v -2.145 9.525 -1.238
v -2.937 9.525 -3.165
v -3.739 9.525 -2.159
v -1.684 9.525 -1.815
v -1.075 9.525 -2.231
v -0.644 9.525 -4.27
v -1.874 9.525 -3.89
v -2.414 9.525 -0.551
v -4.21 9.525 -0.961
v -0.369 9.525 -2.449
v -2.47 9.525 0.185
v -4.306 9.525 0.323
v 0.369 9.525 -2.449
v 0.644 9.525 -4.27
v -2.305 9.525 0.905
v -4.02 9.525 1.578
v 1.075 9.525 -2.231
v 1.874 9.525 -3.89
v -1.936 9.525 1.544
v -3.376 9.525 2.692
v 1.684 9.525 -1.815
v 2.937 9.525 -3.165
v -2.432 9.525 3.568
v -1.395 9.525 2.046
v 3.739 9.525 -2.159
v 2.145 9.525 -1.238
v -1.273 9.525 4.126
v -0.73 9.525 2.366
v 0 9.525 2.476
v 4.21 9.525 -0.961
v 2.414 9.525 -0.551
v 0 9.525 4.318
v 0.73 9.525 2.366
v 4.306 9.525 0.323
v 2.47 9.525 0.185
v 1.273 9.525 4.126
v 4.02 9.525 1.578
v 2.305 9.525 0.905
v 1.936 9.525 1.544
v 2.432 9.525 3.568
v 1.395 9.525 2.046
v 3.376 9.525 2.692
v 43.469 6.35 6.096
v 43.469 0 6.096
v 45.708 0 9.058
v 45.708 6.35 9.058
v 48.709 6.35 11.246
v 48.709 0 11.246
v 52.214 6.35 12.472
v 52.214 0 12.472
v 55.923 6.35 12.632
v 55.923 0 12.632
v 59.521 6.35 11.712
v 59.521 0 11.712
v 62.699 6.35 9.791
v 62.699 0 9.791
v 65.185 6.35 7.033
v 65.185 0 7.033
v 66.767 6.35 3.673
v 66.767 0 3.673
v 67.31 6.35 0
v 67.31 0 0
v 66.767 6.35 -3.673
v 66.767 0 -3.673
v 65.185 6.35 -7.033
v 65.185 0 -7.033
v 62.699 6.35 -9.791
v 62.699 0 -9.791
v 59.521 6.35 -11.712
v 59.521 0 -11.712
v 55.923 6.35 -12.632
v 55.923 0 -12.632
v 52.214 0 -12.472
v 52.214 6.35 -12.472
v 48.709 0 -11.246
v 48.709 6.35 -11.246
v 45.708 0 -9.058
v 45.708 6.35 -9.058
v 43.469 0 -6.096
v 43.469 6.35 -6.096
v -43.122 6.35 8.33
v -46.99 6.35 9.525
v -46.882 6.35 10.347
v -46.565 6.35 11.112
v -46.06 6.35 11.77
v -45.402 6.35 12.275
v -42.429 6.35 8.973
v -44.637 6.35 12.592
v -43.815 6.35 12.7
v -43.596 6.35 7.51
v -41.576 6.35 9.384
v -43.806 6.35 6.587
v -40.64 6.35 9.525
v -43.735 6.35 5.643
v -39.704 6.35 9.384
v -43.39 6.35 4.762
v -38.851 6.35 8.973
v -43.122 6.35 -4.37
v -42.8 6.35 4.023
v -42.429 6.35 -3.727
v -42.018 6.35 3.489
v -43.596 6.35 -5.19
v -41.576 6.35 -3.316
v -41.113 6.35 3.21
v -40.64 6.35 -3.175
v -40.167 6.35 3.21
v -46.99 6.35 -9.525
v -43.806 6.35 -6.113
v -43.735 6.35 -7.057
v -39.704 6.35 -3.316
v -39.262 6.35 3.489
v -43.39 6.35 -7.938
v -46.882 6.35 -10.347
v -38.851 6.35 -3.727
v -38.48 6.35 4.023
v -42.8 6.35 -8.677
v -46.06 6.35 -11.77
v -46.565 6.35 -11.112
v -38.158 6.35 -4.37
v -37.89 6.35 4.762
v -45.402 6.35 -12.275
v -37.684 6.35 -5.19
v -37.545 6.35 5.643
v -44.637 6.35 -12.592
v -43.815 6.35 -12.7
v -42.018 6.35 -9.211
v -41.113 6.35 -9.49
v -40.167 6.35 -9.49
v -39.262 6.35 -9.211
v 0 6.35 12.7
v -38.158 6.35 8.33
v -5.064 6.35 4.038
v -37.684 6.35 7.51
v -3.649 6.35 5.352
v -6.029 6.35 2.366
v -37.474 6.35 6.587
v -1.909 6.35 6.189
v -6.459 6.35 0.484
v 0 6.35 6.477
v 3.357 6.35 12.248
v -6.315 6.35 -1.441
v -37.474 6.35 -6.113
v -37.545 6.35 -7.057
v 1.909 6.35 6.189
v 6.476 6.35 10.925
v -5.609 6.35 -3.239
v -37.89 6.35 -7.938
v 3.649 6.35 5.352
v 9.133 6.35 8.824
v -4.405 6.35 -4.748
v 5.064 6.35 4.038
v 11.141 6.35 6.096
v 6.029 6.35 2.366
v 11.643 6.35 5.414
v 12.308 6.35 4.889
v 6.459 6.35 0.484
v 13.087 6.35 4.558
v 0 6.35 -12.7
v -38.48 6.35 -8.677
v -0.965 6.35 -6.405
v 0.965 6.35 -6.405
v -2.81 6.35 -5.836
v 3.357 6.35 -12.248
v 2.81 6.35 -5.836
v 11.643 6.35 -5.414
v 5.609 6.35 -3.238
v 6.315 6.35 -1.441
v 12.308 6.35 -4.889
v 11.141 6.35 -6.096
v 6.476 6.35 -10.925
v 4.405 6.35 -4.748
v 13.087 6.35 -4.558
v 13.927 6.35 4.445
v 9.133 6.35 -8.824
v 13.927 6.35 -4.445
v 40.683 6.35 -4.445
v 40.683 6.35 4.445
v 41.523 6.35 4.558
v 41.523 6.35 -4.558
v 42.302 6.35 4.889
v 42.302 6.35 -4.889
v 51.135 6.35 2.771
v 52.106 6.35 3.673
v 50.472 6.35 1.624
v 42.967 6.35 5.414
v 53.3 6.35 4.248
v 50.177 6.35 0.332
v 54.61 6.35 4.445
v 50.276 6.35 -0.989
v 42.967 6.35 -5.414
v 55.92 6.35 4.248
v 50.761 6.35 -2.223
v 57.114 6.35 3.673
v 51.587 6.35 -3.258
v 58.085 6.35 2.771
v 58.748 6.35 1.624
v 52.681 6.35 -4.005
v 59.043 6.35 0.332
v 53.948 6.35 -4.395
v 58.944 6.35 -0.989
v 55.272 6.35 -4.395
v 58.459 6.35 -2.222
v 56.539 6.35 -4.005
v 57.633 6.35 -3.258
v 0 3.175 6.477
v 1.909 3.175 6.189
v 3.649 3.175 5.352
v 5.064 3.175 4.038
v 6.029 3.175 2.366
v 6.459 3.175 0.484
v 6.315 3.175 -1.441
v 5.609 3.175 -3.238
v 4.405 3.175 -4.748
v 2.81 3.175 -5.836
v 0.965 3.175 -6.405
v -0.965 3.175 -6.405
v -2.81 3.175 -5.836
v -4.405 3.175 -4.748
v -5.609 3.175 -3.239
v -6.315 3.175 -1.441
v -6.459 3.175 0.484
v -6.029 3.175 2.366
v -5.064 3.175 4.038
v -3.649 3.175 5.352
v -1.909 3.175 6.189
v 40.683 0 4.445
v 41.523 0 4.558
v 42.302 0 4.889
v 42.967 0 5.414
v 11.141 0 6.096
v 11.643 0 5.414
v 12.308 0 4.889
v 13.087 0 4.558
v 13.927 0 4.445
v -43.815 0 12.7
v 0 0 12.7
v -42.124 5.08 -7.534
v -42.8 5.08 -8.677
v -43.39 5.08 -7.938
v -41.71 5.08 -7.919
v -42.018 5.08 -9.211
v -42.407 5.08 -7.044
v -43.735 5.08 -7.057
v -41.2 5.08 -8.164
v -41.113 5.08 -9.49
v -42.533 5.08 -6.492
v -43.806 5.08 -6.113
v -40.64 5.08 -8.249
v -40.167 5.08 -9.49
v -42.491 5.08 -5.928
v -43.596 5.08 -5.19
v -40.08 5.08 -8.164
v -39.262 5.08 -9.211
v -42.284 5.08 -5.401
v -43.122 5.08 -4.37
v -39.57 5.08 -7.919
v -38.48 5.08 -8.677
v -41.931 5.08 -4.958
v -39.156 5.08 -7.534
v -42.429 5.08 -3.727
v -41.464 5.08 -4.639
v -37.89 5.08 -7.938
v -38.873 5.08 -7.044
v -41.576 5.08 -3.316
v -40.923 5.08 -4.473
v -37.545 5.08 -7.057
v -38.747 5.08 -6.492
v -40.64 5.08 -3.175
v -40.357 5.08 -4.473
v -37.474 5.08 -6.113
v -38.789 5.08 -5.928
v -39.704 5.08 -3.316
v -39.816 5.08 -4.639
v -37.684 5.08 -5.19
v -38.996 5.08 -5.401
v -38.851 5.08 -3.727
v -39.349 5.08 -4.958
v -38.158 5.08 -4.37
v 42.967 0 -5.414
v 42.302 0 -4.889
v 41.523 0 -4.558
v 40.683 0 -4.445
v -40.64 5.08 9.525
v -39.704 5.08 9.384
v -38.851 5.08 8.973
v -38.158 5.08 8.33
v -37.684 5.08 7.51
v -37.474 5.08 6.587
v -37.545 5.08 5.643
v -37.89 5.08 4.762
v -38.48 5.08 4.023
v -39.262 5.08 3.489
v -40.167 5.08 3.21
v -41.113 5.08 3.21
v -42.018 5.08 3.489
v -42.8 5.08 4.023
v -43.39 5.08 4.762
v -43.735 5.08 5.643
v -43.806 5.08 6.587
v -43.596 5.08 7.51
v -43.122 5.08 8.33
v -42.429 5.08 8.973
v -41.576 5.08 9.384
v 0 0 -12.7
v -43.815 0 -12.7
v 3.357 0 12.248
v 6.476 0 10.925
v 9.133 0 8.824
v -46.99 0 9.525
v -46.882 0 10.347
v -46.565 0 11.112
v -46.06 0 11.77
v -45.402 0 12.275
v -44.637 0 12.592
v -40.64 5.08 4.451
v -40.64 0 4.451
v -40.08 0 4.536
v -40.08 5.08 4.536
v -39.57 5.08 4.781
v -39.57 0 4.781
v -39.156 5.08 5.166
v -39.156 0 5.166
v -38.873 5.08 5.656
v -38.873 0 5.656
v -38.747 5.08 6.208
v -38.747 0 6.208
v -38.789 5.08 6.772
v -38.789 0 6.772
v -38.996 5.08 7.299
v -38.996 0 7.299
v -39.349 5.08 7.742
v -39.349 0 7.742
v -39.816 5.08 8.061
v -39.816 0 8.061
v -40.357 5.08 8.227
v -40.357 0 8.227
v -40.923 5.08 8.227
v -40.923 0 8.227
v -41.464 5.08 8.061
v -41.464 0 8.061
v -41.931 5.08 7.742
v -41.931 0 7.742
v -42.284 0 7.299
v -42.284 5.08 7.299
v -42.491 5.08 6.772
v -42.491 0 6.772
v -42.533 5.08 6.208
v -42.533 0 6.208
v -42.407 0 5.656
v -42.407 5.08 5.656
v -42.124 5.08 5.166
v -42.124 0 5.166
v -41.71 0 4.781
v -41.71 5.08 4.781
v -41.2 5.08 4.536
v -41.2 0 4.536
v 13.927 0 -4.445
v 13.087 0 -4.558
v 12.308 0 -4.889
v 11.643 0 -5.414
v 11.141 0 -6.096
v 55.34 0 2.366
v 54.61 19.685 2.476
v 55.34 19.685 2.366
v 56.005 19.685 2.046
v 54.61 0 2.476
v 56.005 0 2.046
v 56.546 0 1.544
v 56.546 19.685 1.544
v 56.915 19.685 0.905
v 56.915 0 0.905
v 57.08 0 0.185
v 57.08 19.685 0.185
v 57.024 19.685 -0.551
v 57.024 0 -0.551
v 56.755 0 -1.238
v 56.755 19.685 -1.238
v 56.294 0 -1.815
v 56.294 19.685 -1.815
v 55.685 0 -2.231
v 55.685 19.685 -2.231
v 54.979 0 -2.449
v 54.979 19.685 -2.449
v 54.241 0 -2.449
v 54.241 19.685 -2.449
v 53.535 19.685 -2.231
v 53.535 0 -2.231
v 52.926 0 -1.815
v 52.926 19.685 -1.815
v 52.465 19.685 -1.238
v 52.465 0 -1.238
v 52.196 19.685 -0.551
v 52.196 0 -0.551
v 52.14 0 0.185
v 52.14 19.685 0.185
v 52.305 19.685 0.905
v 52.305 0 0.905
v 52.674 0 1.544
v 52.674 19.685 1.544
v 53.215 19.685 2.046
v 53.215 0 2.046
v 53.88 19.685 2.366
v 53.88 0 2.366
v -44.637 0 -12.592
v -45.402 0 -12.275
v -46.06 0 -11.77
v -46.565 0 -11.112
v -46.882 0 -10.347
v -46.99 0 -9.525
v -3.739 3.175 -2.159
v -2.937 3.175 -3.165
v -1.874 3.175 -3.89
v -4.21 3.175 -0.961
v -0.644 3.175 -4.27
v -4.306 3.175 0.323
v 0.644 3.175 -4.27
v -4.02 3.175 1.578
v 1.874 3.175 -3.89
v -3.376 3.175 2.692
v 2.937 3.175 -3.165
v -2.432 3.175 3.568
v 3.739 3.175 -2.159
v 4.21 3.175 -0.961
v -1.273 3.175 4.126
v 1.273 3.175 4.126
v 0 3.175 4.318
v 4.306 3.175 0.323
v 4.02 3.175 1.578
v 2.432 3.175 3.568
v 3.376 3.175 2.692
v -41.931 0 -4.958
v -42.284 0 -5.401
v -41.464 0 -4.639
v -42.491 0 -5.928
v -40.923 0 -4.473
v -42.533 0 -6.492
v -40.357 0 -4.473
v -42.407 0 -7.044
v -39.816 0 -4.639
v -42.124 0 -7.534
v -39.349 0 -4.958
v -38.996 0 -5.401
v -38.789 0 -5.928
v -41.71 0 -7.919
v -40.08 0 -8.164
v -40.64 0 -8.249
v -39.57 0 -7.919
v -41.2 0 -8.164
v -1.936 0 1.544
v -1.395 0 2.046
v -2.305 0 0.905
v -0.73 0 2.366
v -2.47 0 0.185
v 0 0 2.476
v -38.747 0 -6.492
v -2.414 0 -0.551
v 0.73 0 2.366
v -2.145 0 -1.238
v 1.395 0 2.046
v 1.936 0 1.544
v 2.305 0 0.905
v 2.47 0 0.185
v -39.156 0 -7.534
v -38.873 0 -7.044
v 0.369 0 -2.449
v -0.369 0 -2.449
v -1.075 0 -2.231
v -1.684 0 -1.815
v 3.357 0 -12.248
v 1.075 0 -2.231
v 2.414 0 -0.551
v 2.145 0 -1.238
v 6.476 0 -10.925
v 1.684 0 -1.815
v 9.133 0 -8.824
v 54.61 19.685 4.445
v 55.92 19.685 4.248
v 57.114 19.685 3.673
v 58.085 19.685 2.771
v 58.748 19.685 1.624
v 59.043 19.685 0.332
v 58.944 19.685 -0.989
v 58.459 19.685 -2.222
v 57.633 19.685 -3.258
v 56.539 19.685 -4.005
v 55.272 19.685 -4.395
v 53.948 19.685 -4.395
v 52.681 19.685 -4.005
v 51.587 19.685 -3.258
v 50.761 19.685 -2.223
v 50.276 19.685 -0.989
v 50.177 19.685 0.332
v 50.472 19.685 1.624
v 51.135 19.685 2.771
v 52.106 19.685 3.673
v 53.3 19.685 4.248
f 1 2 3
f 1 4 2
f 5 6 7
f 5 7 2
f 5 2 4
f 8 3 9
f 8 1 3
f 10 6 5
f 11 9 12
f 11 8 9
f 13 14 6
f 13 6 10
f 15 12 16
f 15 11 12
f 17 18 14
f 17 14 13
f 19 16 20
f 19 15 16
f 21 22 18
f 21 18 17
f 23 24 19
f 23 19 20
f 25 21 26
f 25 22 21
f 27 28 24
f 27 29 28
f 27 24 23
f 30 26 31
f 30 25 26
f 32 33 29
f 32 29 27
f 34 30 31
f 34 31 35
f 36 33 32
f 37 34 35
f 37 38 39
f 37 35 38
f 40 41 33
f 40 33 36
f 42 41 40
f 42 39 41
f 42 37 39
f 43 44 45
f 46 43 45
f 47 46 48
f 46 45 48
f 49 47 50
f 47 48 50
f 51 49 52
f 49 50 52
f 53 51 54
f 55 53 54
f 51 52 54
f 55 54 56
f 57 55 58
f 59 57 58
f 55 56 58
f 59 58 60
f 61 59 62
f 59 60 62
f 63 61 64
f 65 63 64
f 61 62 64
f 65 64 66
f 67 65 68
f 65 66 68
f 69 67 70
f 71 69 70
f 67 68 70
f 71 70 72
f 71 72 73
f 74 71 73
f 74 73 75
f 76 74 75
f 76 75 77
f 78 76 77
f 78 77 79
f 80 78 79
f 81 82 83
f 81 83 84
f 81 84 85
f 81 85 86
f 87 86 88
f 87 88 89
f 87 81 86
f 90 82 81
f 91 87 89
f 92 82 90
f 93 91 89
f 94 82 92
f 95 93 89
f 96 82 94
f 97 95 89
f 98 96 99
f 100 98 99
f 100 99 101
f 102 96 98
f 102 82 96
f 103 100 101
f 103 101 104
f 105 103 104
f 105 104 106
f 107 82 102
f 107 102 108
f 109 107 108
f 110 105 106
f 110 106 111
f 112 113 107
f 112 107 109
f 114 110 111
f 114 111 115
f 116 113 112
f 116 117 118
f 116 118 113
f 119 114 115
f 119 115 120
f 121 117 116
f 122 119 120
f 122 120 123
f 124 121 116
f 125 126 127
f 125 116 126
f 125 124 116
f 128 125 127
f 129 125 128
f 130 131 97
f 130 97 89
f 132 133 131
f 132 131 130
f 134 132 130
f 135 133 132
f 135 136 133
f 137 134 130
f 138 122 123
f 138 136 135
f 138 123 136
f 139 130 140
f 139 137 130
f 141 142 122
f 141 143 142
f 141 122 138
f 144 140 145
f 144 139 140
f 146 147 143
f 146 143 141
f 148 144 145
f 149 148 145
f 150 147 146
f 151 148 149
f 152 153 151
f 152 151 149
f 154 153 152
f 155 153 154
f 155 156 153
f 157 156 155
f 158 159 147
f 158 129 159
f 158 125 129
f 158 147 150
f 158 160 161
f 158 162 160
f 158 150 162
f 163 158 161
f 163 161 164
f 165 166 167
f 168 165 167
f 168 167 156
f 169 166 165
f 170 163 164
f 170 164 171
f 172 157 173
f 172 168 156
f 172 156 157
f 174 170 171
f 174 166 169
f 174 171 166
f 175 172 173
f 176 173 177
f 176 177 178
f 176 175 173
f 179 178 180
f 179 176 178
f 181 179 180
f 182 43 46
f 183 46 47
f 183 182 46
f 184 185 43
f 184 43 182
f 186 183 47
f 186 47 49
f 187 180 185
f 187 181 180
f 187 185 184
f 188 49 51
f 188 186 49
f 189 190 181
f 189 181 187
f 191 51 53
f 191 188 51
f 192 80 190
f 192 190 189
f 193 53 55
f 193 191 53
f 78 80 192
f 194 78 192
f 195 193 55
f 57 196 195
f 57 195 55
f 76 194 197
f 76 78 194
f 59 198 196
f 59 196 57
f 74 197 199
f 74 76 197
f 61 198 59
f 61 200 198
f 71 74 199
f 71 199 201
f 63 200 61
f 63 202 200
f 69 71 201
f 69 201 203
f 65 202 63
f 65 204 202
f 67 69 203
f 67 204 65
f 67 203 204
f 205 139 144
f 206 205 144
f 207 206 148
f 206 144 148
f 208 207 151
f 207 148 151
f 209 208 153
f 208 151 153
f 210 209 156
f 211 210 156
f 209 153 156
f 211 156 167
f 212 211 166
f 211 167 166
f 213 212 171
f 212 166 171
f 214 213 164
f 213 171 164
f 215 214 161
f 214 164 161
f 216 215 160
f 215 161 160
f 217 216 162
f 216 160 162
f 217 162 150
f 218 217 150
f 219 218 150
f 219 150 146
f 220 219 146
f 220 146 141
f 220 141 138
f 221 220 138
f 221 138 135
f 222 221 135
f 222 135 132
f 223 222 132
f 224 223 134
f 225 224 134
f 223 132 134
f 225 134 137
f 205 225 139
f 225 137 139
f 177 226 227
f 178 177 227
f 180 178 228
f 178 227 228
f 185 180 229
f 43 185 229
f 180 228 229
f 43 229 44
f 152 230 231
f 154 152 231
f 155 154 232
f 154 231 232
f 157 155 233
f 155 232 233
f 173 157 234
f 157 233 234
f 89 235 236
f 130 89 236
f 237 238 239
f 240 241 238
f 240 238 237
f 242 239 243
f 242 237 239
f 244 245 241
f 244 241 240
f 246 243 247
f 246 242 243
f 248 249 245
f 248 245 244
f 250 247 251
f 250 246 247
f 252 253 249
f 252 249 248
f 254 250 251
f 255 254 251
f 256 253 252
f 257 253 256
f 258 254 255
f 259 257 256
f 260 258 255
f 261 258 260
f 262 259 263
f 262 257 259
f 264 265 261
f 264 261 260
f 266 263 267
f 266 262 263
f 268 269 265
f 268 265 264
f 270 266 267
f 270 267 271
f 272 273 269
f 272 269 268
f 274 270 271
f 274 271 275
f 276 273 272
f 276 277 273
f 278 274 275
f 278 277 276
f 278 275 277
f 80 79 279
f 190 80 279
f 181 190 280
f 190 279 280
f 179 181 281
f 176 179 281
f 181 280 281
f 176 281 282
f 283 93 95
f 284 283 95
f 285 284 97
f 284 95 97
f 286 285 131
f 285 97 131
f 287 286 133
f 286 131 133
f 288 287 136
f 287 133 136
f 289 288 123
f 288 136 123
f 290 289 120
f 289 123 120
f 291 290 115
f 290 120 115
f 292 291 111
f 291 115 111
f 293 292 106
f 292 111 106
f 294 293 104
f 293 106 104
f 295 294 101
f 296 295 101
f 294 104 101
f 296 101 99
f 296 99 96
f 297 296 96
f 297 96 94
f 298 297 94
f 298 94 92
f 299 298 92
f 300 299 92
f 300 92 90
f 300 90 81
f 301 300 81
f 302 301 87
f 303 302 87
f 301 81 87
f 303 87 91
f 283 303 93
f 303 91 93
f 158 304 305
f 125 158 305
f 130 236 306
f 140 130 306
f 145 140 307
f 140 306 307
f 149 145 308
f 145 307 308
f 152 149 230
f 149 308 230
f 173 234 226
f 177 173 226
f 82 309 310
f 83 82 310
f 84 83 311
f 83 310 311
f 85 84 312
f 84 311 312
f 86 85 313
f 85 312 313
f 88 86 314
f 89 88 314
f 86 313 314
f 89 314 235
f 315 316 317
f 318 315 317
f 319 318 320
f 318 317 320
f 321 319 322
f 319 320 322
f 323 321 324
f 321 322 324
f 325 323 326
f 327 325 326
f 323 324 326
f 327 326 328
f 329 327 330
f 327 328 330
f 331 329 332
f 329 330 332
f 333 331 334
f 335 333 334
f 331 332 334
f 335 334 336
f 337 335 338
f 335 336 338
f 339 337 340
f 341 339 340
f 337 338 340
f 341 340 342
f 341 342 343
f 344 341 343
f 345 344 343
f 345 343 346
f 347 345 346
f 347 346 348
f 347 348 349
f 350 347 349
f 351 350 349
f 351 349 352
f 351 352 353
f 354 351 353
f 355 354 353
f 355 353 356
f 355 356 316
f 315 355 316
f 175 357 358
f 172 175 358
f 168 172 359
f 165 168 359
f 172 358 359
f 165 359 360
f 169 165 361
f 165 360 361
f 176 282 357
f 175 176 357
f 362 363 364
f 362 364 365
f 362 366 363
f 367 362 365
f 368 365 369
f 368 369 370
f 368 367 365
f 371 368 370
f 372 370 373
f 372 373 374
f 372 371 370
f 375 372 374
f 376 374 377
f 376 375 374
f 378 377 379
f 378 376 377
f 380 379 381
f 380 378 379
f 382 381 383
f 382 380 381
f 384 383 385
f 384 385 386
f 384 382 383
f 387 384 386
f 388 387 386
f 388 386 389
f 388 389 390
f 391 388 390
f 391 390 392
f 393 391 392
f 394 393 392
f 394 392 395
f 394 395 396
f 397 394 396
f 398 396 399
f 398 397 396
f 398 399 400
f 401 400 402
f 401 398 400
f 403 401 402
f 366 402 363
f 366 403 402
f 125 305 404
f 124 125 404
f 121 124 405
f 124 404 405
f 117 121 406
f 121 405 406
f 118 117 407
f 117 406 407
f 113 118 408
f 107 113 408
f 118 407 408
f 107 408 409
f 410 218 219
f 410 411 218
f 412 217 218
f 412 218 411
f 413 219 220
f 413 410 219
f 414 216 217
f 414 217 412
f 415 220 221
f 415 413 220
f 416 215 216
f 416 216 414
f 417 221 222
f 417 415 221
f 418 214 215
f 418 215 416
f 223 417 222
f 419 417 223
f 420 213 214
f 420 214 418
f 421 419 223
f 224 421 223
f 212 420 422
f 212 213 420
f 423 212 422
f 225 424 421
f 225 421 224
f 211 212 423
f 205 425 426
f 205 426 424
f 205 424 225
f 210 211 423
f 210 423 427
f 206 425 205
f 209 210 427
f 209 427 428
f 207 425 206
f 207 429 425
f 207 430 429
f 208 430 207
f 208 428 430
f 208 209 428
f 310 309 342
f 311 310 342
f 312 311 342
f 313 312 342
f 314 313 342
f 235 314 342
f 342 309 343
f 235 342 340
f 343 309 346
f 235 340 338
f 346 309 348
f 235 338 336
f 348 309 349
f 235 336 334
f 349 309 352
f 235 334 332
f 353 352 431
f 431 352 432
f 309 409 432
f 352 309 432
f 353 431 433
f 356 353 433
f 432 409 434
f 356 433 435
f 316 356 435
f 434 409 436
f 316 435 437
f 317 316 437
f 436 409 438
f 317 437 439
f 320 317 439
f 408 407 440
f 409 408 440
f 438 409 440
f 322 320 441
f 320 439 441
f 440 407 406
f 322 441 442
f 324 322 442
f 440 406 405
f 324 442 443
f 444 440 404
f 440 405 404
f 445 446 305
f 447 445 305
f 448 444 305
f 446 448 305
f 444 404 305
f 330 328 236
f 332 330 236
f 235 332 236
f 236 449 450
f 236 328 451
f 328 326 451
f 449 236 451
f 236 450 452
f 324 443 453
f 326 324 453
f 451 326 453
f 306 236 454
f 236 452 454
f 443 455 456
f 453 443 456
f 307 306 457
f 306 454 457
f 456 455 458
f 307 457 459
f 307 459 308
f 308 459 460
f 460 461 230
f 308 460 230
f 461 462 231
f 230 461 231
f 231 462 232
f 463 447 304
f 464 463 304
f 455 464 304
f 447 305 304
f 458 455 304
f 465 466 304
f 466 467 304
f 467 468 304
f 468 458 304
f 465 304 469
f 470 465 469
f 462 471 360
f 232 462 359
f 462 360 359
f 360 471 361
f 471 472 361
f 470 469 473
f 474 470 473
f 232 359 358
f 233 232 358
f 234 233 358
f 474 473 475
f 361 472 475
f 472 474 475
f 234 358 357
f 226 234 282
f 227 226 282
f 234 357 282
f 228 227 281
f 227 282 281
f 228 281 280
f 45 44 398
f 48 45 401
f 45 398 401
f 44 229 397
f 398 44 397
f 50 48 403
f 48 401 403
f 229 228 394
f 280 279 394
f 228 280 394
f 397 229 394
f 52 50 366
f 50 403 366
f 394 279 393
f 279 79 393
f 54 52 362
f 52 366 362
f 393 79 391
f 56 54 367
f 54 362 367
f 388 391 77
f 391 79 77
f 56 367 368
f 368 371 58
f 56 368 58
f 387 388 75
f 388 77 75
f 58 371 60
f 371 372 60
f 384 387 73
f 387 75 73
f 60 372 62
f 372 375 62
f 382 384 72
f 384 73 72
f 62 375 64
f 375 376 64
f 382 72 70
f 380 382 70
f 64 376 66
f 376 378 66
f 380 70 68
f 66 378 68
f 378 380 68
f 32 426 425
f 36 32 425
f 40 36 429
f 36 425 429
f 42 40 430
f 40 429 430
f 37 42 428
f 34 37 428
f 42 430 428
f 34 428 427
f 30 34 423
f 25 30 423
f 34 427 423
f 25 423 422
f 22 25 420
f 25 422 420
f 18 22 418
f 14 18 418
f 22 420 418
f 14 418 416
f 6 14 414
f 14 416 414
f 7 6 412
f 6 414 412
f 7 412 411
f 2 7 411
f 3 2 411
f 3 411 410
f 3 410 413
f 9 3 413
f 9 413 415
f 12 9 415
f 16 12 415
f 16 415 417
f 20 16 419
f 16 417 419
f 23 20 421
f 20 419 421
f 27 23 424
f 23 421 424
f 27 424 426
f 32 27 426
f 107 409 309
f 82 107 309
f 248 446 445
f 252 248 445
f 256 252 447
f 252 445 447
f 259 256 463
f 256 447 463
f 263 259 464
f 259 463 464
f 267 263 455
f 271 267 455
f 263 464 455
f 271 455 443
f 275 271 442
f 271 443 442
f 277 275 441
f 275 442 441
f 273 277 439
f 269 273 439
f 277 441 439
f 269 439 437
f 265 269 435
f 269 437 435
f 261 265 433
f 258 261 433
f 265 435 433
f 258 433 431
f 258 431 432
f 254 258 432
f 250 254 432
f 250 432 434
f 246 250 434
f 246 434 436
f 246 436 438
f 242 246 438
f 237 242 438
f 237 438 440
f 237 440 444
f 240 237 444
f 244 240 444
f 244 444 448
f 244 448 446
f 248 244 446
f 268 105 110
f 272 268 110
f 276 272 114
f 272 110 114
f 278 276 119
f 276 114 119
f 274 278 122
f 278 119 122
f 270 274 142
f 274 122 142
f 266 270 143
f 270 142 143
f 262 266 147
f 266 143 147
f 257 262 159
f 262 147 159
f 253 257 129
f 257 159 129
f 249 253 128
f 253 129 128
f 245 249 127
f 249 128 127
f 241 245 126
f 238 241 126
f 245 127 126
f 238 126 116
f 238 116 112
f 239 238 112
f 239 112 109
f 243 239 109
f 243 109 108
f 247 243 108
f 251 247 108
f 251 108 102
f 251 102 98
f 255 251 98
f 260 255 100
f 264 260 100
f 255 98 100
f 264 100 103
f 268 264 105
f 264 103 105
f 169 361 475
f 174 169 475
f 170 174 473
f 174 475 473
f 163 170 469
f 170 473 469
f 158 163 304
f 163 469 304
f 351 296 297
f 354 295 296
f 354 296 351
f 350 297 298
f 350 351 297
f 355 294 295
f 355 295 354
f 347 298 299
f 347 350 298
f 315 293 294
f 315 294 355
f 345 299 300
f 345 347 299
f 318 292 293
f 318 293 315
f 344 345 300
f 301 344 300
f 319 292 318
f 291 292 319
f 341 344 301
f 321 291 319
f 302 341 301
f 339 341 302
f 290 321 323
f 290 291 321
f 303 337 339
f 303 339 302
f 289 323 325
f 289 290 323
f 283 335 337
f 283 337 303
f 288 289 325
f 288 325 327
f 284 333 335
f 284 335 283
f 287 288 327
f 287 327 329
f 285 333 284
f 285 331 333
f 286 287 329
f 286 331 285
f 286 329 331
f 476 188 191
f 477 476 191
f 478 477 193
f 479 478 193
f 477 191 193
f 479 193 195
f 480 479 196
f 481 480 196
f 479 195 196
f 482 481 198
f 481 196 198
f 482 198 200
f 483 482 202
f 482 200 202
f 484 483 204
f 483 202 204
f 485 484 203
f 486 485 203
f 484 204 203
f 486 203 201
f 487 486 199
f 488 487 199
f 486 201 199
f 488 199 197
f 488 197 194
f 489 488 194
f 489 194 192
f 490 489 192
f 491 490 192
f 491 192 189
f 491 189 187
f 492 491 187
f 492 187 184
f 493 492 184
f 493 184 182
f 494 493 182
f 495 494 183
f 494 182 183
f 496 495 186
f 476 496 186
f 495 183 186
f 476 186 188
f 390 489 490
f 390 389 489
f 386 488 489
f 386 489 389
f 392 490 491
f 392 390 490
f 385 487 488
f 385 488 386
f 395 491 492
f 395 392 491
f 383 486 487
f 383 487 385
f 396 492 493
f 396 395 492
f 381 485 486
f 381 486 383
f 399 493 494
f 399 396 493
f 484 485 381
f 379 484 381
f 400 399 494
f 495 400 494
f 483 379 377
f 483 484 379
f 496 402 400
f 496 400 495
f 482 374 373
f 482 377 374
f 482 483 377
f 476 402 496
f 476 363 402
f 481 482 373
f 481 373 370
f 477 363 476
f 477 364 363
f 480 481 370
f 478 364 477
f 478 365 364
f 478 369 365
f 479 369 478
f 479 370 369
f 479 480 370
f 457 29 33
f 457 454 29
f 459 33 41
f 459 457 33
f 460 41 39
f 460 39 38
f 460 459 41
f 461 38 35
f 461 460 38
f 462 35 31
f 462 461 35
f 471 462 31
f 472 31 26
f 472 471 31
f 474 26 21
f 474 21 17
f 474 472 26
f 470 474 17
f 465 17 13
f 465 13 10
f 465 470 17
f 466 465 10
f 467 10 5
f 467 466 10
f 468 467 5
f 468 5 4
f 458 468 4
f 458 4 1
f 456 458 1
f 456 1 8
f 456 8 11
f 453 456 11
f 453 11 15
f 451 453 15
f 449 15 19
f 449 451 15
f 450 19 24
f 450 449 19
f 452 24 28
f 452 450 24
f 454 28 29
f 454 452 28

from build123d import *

# Parameters (mm, degrees)
SKETCH1_R              = 2.4765
BOSS_EXTRUDE1_DEPTH    = 6.35
SKETCH2_R              = 6.477
CUT_EXTRUDE1_DEPTH     = 3.175
SKETCH3_R              = 4.318
SKETCH3_R_2            = 2.4765
BOSS_EXTRUDE2_DEPTH    = 6.35
SKETCH4_R              = 4.445
SKETCH4_R_2            = 2.4765
BOSS_EXTRUDE3_DEPTH    = 13.335
SKETCH6_R              = 3.175
CUT_EXTRUDE2_DEPTH     = 1.27
F_10_24_TAPPED_HOLE1_D = 3.7973


with BuildPart() as part:
    # Sketch1 → Boss-Extrude1 (new body)
    with BuildSketch(Plane(origin=(0, 0, 0), x_dir=(1, 0, 0), z_dir=(0, 1, 0))):
        with BuildLine():
            Line((0, 12.7), (-43.815, 12.7))
            ThreePointArc((-43.815, 12.7), (-46.06006403, 11.77006403), (-46.99, 9.525))
            Line((-46.99, 9.525), (-46.99, -9.525))
            ThreePointArc((-46.99, -9.525), (-46.06006403, -11.77006403), (-43.815, -12.7))
            Line((-43.815, -12.7), (0, -12.7))
            ThreePointArc((0, -12.7), (6.475754782, -10.924953089), (11.141309797, -6.096))
            ThreePointArc((11.141309797, -6.096), (12.307698551, -4.888761728), (13.926637247, -4.445))
            Line((13.926637247, -4.445), (40.683362753, -4.445))
            ThreePointArc((40.683362753, -4.445), (42.302301449, -4.888761728), (43.468690203, -6.096))
            ThreePointArc((43.468690203, -6.096), (67.31, 0), (43.468690203, 6.096))
            ThreePointArc((43.468690203, 6.096), (42.302301449, 4.888761728), (40.683362753, 4.445))
            Line((40.683362753, 4.445), (13.926637247, 4.445))
            ThreePointArc((13.926637247, 4.445), (12.307698551, 4.888761728), (11.141309797, 6.096))
            ThreePointArc((11.141309797, 6.096), (6.475754782, 10.924953089), (0, 12.7))
        make_face()
        with Locations(Location((0, 0, 0), (0, 0, 270))):
            Circle(SKETCH1_R, mode=Mode.SUBTRACT)
        with Locations(Location((54.61, 0, 0), (0, 0, 270))):
            Circle(SKETCH1_R, mode=Mode.SUBTRACT)
    extrude(amount=BOSS_EXTRUDE1_DEPTH)

    # Sketch2 → Cut-Extrude1 (cut)
    with BuildSketch(Plane(origin=(0, 6.35, 0), x_dir=(1, 0, 0), z_dir=(0, 1, 0))):
        with Locations(Location((0, 0, 0), (0, 0, 270))):
            Circle(SKETCH2_R)
    extrude(amount=-CUT_EXTRUDE1_DEPTH, mode=Mode.SUBTRACT)

    # Sketch3 → Boss-Extrude2 (add)
    with BuildSketch(Plane(origin=(0, 3.175, 0), x_dir=(1, 0, 0), z_dir=(0, 1, 0))):
        with Locations(Location((0, 0, 0), (0, 0, 270))):
            Circle(SKETCH3_R)
        with Locations(Location((0, 0, 0), (0, 0, 270))):
            Circle(SKETCH3_R_2, mode=Mode.SUBTRACT)
    extrude(amount=BOSS_EXTRUDE2_DEPTH)

    # Sketch4 → Boss-Extrude3 (add)
    with BuildSketch(Plane(origin=(0, 6.35, 0), x_dir=(1, 0, 0), z_dir=(0, 1, 0))):
        with Locations(Location((54.61, 0, 0), (0, 0, 270))):
            Circle(SKETCH4_R)
        with Locations(Location((54.61, 0, 0), (0, 0, 270))):
            Circle(SKETCH4_R_2, mode=Mode.SUBTRACT)
    extrude(amount=BOSS_EXTRUDE3_DEPTH)

    # Sketch6 → Cut-Extrude2 (cut)
    with BuildSketch(Plane(origin=(0, 6.35, 0), x_dir=(1, 0, 0), z_dir=(0, 1, 0))):
        with Locations(Location((-40.64, 6.35, 0), (0, 0, 270))):
            Circle(SKETCH6_R)
        with Locations(Location((-40.64, -6.35, 0), (0, 0, 270))):
            Circle(SKETCH6_R)
    extrude(amount=-CUT_EXTRUDE2_DEPTH, mode=Mode.SUBTRACT)

    # #10-24 Tapped Hole1 (through all)
    with Locations(Plane(origin=(-40.64, 6.35, -6.35), x_dir=(0, 0, 1), z_dir=(0, 1, 0))):
        with Locations((0, 0), (12.7, 0)):
            Hole(F_10_24_TAPPED_HOLE1_D / 2)


solid = part.part
